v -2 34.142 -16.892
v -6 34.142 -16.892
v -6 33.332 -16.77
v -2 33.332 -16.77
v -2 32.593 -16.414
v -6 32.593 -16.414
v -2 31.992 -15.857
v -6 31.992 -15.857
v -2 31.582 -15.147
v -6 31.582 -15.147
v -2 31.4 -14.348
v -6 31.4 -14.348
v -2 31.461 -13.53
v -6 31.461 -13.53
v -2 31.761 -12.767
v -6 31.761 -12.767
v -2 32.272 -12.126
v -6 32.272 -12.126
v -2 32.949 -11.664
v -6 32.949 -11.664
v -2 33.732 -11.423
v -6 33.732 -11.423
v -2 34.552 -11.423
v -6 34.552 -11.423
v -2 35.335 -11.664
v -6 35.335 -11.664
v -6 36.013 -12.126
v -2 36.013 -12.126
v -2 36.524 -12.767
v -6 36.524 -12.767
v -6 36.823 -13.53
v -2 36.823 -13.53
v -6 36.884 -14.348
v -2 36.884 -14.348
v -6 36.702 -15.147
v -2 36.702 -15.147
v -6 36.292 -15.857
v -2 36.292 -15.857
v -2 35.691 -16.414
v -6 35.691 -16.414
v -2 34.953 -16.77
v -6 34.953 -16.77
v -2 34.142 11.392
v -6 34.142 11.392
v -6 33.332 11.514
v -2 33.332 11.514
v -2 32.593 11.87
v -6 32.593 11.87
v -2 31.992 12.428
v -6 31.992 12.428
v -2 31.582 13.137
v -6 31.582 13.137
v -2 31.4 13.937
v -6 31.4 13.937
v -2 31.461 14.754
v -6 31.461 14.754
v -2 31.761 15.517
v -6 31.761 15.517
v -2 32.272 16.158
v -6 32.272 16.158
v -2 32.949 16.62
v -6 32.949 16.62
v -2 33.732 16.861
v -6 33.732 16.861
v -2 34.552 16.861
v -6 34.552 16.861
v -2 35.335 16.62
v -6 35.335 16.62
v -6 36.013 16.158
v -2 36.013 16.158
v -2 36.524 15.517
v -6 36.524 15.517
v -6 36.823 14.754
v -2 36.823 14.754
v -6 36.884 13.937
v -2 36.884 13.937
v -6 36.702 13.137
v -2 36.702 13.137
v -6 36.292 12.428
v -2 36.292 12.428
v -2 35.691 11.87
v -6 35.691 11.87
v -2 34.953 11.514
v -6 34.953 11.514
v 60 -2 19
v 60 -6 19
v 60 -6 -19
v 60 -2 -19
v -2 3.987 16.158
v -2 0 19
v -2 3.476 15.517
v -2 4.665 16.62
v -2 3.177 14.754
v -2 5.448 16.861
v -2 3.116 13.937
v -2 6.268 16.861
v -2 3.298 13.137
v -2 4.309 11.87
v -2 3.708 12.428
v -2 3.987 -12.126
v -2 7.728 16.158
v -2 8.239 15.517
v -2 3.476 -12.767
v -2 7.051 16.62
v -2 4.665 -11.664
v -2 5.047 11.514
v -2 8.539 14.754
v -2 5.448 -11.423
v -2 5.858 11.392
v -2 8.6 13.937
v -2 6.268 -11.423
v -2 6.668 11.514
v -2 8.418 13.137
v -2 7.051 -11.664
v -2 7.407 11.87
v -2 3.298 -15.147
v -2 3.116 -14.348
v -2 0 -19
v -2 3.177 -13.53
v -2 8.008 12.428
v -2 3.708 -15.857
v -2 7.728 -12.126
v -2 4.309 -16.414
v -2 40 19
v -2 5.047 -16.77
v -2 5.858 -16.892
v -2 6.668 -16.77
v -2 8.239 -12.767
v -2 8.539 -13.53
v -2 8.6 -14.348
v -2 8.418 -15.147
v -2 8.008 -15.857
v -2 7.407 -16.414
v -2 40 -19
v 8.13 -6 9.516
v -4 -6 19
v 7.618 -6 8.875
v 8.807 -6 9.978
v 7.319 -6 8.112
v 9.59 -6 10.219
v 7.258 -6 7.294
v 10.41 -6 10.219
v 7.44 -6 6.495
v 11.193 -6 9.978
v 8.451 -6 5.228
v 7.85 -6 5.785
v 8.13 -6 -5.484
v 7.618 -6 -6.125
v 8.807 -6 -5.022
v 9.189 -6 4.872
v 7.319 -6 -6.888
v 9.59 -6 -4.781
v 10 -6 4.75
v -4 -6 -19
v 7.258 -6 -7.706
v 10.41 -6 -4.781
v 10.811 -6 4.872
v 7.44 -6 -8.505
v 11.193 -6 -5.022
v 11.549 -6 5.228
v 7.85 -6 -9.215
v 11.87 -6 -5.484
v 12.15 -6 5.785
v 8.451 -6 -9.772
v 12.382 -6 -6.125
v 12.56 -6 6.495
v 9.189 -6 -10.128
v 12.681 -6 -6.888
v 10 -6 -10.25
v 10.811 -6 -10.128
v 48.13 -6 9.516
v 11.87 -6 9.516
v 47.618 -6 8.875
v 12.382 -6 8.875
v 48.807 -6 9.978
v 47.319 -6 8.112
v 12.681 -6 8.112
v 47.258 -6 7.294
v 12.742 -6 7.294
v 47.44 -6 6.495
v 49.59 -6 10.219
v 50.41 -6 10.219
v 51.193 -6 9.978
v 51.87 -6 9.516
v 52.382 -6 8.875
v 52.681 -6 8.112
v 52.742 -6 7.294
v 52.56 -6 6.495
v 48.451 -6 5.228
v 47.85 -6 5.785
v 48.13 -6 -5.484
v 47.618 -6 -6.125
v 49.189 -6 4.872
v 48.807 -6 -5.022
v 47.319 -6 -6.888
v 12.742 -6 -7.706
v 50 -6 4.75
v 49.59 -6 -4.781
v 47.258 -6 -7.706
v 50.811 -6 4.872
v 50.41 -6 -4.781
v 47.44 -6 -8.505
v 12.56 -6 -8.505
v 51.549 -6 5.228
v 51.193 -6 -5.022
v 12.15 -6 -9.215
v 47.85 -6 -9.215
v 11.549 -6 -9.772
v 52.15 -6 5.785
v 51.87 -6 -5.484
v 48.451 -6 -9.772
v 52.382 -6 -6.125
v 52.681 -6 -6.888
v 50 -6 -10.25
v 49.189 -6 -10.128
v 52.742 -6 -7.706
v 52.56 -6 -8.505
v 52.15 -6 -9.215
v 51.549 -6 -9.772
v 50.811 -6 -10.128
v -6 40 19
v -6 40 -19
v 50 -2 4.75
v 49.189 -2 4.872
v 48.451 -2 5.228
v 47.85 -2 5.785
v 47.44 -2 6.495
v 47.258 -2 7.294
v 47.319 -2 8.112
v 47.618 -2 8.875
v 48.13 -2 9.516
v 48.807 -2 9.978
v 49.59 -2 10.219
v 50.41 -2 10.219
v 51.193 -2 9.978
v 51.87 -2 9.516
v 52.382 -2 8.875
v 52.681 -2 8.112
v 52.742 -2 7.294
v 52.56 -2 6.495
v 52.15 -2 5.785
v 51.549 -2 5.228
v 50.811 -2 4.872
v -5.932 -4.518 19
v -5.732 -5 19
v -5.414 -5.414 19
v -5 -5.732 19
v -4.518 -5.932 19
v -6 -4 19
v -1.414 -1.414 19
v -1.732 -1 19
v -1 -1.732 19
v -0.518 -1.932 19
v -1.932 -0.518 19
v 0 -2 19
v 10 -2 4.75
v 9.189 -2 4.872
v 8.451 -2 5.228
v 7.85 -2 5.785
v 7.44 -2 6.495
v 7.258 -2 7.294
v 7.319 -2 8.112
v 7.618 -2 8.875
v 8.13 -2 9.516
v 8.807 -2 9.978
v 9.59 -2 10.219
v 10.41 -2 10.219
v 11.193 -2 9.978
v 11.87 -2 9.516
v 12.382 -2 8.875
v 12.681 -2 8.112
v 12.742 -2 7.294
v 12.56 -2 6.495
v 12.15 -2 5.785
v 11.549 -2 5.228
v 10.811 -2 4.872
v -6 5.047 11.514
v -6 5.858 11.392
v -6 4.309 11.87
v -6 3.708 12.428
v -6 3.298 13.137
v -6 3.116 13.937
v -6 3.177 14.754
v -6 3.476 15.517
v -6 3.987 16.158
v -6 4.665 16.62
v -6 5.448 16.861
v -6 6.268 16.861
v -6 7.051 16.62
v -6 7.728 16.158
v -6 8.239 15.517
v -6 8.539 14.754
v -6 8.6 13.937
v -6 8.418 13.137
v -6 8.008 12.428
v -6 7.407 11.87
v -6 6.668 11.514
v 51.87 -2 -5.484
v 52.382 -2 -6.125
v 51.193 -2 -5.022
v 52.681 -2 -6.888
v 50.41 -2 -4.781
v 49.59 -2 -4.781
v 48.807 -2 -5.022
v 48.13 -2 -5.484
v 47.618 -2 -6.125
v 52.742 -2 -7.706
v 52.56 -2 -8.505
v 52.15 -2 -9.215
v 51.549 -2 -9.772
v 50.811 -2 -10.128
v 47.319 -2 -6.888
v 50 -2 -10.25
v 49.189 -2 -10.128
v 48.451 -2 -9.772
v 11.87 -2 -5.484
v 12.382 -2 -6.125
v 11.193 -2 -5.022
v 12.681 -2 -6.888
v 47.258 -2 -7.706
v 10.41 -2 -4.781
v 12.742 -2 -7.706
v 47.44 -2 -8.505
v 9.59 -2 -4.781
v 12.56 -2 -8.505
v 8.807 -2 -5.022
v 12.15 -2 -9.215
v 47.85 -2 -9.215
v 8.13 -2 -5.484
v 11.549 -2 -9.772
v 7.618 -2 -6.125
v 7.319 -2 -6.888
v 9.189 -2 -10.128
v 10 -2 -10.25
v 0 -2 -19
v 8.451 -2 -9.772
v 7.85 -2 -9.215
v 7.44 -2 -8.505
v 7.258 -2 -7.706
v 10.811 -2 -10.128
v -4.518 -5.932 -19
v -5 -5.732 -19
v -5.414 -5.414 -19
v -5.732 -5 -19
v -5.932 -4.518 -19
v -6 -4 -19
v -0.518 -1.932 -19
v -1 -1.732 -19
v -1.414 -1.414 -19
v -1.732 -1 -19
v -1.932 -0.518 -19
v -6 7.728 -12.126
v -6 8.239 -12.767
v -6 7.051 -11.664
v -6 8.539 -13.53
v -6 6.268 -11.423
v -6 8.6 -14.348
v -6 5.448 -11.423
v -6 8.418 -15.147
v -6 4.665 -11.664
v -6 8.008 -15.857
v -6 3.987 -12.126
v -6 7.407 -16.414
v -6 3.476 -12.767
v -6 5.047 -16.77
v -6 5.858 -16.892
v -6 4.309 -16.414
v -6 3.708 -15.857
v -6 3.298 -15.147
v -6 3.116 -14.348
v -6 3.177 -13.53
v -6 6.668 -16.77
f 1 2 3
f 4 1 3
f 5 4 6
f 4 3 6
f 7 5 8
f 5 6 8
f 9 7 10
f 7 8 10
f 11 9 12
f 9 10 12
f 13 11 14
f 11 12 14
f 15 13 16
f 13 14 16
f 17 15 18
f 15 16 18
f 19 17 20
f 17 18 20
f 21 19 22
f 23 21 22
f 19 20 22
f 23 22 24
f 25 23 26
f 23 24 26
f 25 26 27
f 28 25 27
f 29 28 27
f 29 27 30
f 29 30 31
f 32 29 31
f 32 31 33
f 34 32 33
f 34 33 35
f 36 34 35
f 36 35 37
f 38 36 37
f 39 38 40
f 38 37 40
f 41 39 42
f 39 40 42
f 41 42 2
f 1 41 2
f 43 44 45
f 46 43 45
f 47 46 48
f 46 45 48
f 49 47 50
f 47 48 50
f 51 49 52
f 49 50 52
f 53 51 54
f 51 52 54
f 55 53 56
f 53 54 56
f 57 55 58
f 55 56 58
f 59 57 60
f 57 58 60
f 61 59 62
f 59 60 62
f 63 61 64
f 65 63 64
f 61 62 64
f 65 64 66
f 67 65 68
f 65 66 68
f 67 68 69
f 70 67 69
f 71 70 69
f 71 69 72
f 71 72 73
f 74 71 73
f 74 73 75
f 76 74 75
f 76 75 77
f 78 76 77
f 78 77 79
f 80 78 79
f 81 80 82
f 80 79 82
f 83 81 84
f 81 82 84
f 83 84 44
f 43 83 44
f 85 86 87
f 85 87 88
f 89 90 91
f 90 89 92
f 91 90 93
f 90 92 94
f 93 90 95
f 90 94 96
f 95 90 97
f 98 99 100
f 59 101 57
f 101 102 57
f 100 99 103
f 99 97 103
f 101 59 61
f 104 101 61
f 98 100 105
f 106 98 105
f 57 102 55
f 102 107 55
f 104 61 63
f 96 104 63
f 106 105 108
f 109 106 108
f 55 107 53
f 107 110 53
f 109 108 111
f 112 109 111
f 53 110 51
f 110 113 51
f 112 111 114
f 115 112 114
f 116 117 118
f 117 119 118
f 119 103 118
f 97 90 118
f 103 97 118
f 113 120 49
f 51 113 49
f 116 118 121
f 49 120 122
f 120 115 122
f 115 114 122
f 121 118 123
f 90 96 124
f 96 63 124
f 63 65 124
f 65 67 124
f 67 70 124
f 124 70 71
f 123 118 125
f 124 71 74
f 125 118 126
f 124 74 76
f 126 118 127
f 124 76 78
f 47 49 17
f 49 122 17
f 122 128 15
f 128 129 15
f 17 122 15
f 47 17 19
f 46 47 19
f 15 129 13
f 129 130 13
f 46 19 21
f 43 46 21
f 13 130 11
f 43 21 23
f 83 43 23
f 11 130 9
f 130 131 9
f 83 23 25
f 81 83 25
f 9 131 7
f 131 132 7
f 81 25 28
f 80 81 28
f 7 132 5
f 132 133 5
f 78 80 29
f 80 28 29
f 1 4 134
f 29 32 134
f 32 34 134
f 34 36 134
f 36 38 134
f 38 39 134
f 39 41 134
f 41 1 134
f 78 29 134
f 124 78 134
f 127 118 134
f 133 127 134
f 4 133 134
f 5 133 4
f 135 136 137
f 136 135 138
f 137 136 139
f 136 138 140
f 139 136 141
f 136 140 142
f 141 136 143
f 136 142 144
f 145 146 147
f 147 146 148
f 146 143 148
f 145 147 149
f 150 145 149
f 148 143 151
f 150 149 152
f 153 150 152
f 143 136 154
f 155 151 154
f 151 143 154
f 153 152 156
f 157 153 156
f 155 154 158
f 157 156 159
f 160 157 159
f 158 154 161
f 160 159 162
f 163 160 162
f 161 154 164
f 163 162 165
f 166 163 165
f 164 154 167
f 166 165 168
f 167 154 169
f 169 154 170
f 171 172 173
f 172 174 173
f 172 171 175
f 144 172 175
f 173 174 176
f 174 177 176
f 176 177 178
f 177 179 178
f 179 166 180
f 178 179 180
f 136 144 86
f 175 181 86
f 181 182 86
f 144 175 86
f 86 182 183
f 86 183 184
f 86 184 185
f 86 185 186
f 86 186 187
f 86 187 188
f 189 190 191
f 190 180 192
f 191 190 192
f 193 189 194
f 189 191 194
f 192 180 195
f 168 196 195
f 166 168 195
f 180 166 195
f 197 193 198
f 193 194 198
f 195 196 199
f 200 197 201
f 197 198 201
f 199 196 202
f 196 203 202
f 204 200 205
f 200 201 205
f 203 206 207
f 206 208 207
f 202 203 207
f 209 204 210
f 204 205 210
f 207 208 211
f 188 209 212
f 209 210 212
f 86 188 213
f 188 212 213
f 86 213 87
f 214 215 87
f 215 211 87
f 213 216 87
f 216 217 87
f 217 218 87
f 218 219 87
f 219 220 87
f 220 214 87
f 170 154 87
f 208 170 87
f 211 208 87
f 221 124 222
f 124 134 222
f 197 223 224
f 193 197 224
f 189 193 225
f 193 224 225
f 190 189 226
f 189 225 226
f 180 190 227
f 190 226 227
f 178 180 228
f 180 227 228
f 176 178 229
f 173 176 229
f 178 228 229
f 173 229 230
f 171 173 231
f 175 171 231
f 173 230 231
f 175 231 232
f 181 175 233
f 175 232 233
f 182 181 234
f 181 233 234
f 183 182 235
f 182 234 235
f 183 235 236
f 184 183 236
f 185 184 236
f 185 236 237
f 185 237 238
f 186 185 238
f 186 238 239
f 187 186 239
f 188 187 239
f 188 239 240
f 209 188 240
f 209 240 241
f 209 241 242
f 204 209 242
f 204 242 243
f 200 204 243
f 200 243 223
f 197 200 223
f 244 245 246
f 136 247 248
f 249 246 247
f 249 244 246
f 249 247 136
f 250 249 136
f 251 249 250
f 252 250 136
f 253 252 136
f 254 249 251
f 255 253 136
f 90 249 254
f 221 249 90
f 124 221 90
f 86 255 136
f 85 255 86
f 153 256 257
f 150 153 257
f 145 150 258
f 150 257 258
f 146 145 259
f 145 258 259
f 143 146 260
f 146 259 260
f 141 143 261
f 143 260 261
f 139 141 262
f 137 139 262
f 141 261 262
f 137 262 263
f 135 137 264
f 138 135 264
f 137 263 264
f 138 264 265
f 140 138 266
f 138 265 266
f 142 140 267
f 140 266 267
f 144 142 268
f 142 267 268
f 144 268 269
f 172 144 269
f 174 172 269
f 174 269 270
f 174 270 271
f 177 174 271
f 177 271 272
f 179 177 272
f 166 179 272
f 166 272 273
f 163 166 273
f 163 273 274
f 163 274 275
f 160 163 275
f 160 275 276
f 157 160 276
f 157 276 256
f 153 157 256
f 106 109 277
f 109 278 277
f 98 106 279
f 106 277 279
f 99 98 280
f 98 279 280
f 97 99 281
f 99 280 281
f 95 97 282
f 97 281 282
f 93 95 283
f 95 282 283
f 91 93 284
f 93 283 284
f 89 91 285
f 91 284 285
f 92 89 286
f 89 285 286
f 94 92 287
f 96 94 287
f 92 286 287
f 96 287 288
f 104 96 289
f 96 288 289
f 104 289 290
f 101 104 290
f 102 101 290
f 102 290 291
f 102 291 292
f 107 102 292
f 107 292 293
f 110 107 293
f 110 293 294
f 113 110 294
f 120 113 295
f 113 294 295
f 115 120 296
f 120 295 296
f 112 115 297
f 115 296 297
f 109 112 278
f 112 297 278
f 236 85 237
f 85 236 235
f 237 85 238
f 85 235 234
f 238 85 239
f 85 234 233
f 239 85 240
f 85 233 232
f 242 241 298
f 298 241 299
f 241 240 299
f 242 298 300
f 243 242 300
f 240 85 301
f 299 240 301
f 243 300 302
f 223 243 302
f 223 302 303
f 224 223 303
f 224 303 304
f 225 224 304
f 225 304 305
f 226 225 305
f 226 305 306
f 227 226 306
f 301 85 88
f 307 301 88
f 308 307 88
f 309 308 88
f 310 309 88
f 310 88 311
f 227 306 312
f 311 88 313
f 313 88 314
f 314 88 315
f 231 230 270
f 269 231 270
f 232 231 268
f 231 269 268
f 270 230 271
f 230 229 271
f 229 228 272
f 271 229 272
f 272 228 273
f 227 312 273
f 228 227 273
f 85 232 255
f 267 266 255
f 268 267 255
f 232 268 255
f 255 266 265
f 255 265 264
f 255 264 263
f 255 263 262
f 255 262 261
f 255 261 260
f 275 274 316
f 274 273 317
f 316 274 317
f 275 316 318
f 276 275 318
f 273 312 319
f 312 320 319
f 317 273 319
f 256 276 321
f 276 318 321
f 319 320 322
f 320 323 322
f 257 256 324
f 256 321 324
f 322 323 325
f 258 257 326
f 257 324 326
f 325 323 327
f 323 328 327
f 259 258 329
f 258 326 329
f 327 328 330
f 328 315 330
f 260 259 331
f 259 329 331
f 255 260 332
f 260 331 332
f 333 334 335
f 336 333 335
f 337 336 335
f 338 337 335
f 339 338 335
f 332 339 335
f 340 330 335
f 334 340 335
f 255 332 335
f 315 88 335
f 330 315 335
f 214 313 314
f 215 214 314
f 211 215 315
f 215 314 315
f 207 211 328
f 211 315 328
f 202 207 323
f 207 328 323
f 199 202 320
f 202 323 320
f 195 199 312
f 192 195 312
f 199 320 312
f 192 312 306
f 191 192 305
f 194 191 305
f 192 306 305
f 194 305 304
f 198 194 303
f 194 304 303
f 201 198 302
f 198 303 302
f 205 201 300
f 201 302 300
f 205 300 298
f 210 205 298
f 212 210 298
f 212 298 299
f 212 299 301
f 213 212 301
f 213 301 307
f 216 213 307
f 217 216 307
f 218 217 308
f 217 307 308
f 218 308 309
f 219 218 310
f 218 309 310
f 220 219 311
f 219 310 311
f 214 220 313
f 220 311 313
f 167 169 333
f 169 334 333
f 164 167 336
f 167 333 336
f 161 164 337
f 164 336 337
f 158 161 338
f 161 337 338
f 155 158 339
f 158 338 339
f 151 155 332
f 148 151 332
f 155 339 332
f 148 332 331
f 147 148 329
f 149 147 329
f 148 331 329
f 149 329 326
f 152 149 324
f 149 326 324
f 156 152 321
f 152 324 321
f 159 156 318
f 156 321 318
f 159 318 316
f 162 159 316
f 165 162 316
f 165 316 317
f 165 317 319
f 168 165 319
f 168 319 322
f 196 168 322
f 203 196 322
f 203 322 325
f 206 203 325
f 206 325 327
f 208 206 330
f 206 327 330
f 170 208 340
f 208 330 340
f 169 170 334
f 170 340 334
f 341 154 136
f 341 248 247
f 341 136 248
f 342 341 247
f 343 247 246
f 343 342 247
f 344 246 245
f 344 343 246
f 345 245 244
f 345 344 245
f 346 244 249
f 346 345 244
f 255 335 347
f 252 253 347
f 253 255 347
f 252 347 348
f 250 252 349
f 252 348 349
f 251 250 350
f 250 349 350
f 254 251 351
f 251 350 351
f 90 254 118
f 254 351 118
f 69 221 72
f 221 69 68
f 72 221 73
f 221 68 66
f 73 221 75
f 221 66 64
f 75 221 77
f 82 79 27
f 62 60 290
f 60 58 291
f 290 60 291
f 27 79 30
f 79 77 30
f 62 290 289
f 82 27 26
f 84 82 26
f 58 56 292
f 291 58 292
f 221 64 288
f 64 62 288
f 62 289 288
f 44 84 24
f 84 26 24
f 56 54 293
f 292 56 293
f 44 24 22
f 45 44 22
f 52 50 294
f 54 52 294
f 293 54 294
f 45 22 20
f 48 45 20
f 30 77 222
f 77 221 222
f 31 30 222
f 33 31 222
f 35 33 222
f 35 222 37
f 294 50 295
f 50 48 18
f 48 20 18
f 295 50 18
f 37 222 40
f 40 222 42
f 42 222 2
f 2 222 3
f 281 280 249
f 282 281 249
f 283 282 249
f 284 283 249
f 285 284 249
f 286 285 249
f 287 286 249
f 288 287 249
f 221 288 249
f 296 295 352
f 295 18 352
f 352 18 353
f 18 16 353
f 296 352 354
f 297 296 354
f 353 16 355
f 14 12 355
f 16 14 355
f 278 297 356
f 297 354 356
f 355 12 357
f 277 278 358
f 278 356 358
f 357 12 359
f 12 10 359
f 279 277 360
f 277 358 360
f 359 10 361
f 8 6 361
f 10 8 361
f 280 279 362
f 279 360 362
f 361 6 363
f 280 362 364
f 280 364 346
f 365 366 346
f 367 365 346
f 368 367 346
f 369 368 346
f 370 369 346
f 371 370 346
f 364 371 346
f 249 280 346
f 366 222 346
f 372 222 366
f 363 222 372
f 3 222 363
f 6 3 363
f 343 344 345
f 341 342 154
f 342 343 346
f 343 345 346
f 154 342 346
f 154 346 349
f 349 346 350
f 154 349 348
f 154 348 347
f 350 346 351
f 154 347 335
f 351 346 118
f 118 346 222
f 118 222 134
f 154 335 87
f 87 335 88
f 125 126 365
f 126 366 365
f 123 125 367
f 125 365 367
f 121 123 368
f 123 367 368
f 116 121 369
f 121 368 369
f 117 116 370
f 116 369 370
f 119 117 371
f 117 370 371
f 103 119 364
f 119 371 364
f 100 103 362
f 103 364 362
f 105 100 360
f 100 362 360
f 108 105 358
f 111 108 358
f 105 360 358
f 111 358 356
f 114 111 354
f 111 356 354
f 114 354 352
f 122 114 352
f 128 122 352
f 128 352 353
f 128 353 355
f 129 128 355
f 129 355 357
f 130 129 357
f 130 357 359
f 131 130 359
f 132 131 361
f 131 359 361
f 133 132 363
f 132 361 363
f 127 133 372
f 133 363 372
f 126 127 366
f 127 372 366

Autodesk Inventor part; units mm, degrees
ref_plane "YZ Plane" through (0, 0, 0) normal (1, 0, 0) x (0, 1, 0)
ref_plane "XZ Plane" through (0, 0, 0) normal (0, 1, 0) x (-1, 0, 0)
ref_plane "XY Plane" through (0, 0, 0) normal (0, 0, 1) x (1, 0, 0)
sketch "Sketch1" plane through (0, 0, 0) normal (0, 0, 1) x (1, 0, 0)
  line L0 (-19.6971, 0) -> (73.2828, 0) construction
  line L1 (0, 49.2828) -> (0, -15.6971) construction
  line L2 (-6, 40) -> (-6, -4)
  line L3 (-4, -6) -> (60, -6)
  line L4 (60, -6) -> (60, -2)
  line L5 (60, -2) -> (0, -2)
  line L6 (-2, 0) -> (-2, 40)
  line L7 (-2, 40) -> (-6, 40)
  arc A0 (-2, 0) -> (0, -2) centre (0, 0) ccw
  arc A1 (-6, -4) -> (-4, -6) centre (-4, -4) ccw
  dimension "d0" = 2
  dimension "d1" = 4
  dimension "d2" = 4
  dimension "d3" = 40
  dimension "d5" = 60
extrude "Extrusion1" add sketch "Sketch1" along normal mid plane 38
sketch "Sketch2" plane through (-2, 0, 19) normal (1, 0, 0) x (0, 0, -1)
  line L0 (0, 40) -> (38, 40) construction
  line L1 (0, 0) -> (0, 40) construction
  line L2 (38, 0) -> (0, 0) construction
  line L3 (38, 40) -> (38, 0) construction
  line L4 (0, 0) -> (0, 40) construction
  line L5 (0, 20) -> (38, 20) construction
  line L6 (19, 0) -> (19, 40) construction
  line L7 (0, 40) -> (38, 40) construction
  circle A0 centre (19, 20) radius 20 construction
  point P0 (33.1421, 5.8579)
  point P1 (33.1421, 34.1421)
  point P2 (4.8579, 5.8579)
  point P3 (4.8579, 34.1421)
  dimension "d17" = 40
  dimension "d18" = 28.2843
  dimension "d19" = 28.2843
hole "Hole1" at (-2, 5.8579, -14.1421) at (-2, 34.1421, -14.1421) at (-2, 5.8579, 14.1421) at (-2, 34.1421, 14.1421) direction (-1, 0, 0) diameter 5.5 end through all clearance for "Socket Head Cap Screw" size "M5" standard "Ansi Metric M Profile"
sketch "Sketch3" plane through (-4, -6, 19) normal (0, -1, 0) x (1, 0, 0)
  line L0 (64, -38) -> (64, 0) construction
  line L1 (0, 0) -> (64, 0) construction
  line L2 (0, -38) -> (0, 0) construction
  line L3 (64, -38) -> (0, -38) construction
  line L4 (64, -19) -> (0, -19) construction
  line L5 (0, -38) -> (0, 0) construction
  line L6 (64, 0) -> (4, 0) construction
  line L7 (4, -38) -> (64, -38) construction
  line L8 (54, -11.5) -> (14, -11.5) construction
  line L9 (14, -11.5) -> (14, -26.5) construction
  line L10 (14, -26.5) -> (54, -26.5) construction
  line L11 (54, -26.5) -> (54, -11.5) construction
  line L12 (64, -38) -> (0, -38) construction
  line L13 (2, 0) -> (-2, 0) construction
  line L14 (4, -38) -> (4, 0) construction
  line L15 (34, 0) -> (34, -38) construction
  point P0 (4, -19)
  dimension "d20" = 15
  dimension "d21" = 40
hole "Hole2" at (50, -6, 7.5) at (50, -6, -7.5) at (10, -6, -7.5) at (10, -6, 7.5) direction (0, 1, 0) diameter 5.5 end through all clearance for "Socket Head Cap Screw" size "M5" standard "Ansi Metric M Profile"
equation "\"d18\" = d19"
properties part number "L_connector_actuators_endeffector"
